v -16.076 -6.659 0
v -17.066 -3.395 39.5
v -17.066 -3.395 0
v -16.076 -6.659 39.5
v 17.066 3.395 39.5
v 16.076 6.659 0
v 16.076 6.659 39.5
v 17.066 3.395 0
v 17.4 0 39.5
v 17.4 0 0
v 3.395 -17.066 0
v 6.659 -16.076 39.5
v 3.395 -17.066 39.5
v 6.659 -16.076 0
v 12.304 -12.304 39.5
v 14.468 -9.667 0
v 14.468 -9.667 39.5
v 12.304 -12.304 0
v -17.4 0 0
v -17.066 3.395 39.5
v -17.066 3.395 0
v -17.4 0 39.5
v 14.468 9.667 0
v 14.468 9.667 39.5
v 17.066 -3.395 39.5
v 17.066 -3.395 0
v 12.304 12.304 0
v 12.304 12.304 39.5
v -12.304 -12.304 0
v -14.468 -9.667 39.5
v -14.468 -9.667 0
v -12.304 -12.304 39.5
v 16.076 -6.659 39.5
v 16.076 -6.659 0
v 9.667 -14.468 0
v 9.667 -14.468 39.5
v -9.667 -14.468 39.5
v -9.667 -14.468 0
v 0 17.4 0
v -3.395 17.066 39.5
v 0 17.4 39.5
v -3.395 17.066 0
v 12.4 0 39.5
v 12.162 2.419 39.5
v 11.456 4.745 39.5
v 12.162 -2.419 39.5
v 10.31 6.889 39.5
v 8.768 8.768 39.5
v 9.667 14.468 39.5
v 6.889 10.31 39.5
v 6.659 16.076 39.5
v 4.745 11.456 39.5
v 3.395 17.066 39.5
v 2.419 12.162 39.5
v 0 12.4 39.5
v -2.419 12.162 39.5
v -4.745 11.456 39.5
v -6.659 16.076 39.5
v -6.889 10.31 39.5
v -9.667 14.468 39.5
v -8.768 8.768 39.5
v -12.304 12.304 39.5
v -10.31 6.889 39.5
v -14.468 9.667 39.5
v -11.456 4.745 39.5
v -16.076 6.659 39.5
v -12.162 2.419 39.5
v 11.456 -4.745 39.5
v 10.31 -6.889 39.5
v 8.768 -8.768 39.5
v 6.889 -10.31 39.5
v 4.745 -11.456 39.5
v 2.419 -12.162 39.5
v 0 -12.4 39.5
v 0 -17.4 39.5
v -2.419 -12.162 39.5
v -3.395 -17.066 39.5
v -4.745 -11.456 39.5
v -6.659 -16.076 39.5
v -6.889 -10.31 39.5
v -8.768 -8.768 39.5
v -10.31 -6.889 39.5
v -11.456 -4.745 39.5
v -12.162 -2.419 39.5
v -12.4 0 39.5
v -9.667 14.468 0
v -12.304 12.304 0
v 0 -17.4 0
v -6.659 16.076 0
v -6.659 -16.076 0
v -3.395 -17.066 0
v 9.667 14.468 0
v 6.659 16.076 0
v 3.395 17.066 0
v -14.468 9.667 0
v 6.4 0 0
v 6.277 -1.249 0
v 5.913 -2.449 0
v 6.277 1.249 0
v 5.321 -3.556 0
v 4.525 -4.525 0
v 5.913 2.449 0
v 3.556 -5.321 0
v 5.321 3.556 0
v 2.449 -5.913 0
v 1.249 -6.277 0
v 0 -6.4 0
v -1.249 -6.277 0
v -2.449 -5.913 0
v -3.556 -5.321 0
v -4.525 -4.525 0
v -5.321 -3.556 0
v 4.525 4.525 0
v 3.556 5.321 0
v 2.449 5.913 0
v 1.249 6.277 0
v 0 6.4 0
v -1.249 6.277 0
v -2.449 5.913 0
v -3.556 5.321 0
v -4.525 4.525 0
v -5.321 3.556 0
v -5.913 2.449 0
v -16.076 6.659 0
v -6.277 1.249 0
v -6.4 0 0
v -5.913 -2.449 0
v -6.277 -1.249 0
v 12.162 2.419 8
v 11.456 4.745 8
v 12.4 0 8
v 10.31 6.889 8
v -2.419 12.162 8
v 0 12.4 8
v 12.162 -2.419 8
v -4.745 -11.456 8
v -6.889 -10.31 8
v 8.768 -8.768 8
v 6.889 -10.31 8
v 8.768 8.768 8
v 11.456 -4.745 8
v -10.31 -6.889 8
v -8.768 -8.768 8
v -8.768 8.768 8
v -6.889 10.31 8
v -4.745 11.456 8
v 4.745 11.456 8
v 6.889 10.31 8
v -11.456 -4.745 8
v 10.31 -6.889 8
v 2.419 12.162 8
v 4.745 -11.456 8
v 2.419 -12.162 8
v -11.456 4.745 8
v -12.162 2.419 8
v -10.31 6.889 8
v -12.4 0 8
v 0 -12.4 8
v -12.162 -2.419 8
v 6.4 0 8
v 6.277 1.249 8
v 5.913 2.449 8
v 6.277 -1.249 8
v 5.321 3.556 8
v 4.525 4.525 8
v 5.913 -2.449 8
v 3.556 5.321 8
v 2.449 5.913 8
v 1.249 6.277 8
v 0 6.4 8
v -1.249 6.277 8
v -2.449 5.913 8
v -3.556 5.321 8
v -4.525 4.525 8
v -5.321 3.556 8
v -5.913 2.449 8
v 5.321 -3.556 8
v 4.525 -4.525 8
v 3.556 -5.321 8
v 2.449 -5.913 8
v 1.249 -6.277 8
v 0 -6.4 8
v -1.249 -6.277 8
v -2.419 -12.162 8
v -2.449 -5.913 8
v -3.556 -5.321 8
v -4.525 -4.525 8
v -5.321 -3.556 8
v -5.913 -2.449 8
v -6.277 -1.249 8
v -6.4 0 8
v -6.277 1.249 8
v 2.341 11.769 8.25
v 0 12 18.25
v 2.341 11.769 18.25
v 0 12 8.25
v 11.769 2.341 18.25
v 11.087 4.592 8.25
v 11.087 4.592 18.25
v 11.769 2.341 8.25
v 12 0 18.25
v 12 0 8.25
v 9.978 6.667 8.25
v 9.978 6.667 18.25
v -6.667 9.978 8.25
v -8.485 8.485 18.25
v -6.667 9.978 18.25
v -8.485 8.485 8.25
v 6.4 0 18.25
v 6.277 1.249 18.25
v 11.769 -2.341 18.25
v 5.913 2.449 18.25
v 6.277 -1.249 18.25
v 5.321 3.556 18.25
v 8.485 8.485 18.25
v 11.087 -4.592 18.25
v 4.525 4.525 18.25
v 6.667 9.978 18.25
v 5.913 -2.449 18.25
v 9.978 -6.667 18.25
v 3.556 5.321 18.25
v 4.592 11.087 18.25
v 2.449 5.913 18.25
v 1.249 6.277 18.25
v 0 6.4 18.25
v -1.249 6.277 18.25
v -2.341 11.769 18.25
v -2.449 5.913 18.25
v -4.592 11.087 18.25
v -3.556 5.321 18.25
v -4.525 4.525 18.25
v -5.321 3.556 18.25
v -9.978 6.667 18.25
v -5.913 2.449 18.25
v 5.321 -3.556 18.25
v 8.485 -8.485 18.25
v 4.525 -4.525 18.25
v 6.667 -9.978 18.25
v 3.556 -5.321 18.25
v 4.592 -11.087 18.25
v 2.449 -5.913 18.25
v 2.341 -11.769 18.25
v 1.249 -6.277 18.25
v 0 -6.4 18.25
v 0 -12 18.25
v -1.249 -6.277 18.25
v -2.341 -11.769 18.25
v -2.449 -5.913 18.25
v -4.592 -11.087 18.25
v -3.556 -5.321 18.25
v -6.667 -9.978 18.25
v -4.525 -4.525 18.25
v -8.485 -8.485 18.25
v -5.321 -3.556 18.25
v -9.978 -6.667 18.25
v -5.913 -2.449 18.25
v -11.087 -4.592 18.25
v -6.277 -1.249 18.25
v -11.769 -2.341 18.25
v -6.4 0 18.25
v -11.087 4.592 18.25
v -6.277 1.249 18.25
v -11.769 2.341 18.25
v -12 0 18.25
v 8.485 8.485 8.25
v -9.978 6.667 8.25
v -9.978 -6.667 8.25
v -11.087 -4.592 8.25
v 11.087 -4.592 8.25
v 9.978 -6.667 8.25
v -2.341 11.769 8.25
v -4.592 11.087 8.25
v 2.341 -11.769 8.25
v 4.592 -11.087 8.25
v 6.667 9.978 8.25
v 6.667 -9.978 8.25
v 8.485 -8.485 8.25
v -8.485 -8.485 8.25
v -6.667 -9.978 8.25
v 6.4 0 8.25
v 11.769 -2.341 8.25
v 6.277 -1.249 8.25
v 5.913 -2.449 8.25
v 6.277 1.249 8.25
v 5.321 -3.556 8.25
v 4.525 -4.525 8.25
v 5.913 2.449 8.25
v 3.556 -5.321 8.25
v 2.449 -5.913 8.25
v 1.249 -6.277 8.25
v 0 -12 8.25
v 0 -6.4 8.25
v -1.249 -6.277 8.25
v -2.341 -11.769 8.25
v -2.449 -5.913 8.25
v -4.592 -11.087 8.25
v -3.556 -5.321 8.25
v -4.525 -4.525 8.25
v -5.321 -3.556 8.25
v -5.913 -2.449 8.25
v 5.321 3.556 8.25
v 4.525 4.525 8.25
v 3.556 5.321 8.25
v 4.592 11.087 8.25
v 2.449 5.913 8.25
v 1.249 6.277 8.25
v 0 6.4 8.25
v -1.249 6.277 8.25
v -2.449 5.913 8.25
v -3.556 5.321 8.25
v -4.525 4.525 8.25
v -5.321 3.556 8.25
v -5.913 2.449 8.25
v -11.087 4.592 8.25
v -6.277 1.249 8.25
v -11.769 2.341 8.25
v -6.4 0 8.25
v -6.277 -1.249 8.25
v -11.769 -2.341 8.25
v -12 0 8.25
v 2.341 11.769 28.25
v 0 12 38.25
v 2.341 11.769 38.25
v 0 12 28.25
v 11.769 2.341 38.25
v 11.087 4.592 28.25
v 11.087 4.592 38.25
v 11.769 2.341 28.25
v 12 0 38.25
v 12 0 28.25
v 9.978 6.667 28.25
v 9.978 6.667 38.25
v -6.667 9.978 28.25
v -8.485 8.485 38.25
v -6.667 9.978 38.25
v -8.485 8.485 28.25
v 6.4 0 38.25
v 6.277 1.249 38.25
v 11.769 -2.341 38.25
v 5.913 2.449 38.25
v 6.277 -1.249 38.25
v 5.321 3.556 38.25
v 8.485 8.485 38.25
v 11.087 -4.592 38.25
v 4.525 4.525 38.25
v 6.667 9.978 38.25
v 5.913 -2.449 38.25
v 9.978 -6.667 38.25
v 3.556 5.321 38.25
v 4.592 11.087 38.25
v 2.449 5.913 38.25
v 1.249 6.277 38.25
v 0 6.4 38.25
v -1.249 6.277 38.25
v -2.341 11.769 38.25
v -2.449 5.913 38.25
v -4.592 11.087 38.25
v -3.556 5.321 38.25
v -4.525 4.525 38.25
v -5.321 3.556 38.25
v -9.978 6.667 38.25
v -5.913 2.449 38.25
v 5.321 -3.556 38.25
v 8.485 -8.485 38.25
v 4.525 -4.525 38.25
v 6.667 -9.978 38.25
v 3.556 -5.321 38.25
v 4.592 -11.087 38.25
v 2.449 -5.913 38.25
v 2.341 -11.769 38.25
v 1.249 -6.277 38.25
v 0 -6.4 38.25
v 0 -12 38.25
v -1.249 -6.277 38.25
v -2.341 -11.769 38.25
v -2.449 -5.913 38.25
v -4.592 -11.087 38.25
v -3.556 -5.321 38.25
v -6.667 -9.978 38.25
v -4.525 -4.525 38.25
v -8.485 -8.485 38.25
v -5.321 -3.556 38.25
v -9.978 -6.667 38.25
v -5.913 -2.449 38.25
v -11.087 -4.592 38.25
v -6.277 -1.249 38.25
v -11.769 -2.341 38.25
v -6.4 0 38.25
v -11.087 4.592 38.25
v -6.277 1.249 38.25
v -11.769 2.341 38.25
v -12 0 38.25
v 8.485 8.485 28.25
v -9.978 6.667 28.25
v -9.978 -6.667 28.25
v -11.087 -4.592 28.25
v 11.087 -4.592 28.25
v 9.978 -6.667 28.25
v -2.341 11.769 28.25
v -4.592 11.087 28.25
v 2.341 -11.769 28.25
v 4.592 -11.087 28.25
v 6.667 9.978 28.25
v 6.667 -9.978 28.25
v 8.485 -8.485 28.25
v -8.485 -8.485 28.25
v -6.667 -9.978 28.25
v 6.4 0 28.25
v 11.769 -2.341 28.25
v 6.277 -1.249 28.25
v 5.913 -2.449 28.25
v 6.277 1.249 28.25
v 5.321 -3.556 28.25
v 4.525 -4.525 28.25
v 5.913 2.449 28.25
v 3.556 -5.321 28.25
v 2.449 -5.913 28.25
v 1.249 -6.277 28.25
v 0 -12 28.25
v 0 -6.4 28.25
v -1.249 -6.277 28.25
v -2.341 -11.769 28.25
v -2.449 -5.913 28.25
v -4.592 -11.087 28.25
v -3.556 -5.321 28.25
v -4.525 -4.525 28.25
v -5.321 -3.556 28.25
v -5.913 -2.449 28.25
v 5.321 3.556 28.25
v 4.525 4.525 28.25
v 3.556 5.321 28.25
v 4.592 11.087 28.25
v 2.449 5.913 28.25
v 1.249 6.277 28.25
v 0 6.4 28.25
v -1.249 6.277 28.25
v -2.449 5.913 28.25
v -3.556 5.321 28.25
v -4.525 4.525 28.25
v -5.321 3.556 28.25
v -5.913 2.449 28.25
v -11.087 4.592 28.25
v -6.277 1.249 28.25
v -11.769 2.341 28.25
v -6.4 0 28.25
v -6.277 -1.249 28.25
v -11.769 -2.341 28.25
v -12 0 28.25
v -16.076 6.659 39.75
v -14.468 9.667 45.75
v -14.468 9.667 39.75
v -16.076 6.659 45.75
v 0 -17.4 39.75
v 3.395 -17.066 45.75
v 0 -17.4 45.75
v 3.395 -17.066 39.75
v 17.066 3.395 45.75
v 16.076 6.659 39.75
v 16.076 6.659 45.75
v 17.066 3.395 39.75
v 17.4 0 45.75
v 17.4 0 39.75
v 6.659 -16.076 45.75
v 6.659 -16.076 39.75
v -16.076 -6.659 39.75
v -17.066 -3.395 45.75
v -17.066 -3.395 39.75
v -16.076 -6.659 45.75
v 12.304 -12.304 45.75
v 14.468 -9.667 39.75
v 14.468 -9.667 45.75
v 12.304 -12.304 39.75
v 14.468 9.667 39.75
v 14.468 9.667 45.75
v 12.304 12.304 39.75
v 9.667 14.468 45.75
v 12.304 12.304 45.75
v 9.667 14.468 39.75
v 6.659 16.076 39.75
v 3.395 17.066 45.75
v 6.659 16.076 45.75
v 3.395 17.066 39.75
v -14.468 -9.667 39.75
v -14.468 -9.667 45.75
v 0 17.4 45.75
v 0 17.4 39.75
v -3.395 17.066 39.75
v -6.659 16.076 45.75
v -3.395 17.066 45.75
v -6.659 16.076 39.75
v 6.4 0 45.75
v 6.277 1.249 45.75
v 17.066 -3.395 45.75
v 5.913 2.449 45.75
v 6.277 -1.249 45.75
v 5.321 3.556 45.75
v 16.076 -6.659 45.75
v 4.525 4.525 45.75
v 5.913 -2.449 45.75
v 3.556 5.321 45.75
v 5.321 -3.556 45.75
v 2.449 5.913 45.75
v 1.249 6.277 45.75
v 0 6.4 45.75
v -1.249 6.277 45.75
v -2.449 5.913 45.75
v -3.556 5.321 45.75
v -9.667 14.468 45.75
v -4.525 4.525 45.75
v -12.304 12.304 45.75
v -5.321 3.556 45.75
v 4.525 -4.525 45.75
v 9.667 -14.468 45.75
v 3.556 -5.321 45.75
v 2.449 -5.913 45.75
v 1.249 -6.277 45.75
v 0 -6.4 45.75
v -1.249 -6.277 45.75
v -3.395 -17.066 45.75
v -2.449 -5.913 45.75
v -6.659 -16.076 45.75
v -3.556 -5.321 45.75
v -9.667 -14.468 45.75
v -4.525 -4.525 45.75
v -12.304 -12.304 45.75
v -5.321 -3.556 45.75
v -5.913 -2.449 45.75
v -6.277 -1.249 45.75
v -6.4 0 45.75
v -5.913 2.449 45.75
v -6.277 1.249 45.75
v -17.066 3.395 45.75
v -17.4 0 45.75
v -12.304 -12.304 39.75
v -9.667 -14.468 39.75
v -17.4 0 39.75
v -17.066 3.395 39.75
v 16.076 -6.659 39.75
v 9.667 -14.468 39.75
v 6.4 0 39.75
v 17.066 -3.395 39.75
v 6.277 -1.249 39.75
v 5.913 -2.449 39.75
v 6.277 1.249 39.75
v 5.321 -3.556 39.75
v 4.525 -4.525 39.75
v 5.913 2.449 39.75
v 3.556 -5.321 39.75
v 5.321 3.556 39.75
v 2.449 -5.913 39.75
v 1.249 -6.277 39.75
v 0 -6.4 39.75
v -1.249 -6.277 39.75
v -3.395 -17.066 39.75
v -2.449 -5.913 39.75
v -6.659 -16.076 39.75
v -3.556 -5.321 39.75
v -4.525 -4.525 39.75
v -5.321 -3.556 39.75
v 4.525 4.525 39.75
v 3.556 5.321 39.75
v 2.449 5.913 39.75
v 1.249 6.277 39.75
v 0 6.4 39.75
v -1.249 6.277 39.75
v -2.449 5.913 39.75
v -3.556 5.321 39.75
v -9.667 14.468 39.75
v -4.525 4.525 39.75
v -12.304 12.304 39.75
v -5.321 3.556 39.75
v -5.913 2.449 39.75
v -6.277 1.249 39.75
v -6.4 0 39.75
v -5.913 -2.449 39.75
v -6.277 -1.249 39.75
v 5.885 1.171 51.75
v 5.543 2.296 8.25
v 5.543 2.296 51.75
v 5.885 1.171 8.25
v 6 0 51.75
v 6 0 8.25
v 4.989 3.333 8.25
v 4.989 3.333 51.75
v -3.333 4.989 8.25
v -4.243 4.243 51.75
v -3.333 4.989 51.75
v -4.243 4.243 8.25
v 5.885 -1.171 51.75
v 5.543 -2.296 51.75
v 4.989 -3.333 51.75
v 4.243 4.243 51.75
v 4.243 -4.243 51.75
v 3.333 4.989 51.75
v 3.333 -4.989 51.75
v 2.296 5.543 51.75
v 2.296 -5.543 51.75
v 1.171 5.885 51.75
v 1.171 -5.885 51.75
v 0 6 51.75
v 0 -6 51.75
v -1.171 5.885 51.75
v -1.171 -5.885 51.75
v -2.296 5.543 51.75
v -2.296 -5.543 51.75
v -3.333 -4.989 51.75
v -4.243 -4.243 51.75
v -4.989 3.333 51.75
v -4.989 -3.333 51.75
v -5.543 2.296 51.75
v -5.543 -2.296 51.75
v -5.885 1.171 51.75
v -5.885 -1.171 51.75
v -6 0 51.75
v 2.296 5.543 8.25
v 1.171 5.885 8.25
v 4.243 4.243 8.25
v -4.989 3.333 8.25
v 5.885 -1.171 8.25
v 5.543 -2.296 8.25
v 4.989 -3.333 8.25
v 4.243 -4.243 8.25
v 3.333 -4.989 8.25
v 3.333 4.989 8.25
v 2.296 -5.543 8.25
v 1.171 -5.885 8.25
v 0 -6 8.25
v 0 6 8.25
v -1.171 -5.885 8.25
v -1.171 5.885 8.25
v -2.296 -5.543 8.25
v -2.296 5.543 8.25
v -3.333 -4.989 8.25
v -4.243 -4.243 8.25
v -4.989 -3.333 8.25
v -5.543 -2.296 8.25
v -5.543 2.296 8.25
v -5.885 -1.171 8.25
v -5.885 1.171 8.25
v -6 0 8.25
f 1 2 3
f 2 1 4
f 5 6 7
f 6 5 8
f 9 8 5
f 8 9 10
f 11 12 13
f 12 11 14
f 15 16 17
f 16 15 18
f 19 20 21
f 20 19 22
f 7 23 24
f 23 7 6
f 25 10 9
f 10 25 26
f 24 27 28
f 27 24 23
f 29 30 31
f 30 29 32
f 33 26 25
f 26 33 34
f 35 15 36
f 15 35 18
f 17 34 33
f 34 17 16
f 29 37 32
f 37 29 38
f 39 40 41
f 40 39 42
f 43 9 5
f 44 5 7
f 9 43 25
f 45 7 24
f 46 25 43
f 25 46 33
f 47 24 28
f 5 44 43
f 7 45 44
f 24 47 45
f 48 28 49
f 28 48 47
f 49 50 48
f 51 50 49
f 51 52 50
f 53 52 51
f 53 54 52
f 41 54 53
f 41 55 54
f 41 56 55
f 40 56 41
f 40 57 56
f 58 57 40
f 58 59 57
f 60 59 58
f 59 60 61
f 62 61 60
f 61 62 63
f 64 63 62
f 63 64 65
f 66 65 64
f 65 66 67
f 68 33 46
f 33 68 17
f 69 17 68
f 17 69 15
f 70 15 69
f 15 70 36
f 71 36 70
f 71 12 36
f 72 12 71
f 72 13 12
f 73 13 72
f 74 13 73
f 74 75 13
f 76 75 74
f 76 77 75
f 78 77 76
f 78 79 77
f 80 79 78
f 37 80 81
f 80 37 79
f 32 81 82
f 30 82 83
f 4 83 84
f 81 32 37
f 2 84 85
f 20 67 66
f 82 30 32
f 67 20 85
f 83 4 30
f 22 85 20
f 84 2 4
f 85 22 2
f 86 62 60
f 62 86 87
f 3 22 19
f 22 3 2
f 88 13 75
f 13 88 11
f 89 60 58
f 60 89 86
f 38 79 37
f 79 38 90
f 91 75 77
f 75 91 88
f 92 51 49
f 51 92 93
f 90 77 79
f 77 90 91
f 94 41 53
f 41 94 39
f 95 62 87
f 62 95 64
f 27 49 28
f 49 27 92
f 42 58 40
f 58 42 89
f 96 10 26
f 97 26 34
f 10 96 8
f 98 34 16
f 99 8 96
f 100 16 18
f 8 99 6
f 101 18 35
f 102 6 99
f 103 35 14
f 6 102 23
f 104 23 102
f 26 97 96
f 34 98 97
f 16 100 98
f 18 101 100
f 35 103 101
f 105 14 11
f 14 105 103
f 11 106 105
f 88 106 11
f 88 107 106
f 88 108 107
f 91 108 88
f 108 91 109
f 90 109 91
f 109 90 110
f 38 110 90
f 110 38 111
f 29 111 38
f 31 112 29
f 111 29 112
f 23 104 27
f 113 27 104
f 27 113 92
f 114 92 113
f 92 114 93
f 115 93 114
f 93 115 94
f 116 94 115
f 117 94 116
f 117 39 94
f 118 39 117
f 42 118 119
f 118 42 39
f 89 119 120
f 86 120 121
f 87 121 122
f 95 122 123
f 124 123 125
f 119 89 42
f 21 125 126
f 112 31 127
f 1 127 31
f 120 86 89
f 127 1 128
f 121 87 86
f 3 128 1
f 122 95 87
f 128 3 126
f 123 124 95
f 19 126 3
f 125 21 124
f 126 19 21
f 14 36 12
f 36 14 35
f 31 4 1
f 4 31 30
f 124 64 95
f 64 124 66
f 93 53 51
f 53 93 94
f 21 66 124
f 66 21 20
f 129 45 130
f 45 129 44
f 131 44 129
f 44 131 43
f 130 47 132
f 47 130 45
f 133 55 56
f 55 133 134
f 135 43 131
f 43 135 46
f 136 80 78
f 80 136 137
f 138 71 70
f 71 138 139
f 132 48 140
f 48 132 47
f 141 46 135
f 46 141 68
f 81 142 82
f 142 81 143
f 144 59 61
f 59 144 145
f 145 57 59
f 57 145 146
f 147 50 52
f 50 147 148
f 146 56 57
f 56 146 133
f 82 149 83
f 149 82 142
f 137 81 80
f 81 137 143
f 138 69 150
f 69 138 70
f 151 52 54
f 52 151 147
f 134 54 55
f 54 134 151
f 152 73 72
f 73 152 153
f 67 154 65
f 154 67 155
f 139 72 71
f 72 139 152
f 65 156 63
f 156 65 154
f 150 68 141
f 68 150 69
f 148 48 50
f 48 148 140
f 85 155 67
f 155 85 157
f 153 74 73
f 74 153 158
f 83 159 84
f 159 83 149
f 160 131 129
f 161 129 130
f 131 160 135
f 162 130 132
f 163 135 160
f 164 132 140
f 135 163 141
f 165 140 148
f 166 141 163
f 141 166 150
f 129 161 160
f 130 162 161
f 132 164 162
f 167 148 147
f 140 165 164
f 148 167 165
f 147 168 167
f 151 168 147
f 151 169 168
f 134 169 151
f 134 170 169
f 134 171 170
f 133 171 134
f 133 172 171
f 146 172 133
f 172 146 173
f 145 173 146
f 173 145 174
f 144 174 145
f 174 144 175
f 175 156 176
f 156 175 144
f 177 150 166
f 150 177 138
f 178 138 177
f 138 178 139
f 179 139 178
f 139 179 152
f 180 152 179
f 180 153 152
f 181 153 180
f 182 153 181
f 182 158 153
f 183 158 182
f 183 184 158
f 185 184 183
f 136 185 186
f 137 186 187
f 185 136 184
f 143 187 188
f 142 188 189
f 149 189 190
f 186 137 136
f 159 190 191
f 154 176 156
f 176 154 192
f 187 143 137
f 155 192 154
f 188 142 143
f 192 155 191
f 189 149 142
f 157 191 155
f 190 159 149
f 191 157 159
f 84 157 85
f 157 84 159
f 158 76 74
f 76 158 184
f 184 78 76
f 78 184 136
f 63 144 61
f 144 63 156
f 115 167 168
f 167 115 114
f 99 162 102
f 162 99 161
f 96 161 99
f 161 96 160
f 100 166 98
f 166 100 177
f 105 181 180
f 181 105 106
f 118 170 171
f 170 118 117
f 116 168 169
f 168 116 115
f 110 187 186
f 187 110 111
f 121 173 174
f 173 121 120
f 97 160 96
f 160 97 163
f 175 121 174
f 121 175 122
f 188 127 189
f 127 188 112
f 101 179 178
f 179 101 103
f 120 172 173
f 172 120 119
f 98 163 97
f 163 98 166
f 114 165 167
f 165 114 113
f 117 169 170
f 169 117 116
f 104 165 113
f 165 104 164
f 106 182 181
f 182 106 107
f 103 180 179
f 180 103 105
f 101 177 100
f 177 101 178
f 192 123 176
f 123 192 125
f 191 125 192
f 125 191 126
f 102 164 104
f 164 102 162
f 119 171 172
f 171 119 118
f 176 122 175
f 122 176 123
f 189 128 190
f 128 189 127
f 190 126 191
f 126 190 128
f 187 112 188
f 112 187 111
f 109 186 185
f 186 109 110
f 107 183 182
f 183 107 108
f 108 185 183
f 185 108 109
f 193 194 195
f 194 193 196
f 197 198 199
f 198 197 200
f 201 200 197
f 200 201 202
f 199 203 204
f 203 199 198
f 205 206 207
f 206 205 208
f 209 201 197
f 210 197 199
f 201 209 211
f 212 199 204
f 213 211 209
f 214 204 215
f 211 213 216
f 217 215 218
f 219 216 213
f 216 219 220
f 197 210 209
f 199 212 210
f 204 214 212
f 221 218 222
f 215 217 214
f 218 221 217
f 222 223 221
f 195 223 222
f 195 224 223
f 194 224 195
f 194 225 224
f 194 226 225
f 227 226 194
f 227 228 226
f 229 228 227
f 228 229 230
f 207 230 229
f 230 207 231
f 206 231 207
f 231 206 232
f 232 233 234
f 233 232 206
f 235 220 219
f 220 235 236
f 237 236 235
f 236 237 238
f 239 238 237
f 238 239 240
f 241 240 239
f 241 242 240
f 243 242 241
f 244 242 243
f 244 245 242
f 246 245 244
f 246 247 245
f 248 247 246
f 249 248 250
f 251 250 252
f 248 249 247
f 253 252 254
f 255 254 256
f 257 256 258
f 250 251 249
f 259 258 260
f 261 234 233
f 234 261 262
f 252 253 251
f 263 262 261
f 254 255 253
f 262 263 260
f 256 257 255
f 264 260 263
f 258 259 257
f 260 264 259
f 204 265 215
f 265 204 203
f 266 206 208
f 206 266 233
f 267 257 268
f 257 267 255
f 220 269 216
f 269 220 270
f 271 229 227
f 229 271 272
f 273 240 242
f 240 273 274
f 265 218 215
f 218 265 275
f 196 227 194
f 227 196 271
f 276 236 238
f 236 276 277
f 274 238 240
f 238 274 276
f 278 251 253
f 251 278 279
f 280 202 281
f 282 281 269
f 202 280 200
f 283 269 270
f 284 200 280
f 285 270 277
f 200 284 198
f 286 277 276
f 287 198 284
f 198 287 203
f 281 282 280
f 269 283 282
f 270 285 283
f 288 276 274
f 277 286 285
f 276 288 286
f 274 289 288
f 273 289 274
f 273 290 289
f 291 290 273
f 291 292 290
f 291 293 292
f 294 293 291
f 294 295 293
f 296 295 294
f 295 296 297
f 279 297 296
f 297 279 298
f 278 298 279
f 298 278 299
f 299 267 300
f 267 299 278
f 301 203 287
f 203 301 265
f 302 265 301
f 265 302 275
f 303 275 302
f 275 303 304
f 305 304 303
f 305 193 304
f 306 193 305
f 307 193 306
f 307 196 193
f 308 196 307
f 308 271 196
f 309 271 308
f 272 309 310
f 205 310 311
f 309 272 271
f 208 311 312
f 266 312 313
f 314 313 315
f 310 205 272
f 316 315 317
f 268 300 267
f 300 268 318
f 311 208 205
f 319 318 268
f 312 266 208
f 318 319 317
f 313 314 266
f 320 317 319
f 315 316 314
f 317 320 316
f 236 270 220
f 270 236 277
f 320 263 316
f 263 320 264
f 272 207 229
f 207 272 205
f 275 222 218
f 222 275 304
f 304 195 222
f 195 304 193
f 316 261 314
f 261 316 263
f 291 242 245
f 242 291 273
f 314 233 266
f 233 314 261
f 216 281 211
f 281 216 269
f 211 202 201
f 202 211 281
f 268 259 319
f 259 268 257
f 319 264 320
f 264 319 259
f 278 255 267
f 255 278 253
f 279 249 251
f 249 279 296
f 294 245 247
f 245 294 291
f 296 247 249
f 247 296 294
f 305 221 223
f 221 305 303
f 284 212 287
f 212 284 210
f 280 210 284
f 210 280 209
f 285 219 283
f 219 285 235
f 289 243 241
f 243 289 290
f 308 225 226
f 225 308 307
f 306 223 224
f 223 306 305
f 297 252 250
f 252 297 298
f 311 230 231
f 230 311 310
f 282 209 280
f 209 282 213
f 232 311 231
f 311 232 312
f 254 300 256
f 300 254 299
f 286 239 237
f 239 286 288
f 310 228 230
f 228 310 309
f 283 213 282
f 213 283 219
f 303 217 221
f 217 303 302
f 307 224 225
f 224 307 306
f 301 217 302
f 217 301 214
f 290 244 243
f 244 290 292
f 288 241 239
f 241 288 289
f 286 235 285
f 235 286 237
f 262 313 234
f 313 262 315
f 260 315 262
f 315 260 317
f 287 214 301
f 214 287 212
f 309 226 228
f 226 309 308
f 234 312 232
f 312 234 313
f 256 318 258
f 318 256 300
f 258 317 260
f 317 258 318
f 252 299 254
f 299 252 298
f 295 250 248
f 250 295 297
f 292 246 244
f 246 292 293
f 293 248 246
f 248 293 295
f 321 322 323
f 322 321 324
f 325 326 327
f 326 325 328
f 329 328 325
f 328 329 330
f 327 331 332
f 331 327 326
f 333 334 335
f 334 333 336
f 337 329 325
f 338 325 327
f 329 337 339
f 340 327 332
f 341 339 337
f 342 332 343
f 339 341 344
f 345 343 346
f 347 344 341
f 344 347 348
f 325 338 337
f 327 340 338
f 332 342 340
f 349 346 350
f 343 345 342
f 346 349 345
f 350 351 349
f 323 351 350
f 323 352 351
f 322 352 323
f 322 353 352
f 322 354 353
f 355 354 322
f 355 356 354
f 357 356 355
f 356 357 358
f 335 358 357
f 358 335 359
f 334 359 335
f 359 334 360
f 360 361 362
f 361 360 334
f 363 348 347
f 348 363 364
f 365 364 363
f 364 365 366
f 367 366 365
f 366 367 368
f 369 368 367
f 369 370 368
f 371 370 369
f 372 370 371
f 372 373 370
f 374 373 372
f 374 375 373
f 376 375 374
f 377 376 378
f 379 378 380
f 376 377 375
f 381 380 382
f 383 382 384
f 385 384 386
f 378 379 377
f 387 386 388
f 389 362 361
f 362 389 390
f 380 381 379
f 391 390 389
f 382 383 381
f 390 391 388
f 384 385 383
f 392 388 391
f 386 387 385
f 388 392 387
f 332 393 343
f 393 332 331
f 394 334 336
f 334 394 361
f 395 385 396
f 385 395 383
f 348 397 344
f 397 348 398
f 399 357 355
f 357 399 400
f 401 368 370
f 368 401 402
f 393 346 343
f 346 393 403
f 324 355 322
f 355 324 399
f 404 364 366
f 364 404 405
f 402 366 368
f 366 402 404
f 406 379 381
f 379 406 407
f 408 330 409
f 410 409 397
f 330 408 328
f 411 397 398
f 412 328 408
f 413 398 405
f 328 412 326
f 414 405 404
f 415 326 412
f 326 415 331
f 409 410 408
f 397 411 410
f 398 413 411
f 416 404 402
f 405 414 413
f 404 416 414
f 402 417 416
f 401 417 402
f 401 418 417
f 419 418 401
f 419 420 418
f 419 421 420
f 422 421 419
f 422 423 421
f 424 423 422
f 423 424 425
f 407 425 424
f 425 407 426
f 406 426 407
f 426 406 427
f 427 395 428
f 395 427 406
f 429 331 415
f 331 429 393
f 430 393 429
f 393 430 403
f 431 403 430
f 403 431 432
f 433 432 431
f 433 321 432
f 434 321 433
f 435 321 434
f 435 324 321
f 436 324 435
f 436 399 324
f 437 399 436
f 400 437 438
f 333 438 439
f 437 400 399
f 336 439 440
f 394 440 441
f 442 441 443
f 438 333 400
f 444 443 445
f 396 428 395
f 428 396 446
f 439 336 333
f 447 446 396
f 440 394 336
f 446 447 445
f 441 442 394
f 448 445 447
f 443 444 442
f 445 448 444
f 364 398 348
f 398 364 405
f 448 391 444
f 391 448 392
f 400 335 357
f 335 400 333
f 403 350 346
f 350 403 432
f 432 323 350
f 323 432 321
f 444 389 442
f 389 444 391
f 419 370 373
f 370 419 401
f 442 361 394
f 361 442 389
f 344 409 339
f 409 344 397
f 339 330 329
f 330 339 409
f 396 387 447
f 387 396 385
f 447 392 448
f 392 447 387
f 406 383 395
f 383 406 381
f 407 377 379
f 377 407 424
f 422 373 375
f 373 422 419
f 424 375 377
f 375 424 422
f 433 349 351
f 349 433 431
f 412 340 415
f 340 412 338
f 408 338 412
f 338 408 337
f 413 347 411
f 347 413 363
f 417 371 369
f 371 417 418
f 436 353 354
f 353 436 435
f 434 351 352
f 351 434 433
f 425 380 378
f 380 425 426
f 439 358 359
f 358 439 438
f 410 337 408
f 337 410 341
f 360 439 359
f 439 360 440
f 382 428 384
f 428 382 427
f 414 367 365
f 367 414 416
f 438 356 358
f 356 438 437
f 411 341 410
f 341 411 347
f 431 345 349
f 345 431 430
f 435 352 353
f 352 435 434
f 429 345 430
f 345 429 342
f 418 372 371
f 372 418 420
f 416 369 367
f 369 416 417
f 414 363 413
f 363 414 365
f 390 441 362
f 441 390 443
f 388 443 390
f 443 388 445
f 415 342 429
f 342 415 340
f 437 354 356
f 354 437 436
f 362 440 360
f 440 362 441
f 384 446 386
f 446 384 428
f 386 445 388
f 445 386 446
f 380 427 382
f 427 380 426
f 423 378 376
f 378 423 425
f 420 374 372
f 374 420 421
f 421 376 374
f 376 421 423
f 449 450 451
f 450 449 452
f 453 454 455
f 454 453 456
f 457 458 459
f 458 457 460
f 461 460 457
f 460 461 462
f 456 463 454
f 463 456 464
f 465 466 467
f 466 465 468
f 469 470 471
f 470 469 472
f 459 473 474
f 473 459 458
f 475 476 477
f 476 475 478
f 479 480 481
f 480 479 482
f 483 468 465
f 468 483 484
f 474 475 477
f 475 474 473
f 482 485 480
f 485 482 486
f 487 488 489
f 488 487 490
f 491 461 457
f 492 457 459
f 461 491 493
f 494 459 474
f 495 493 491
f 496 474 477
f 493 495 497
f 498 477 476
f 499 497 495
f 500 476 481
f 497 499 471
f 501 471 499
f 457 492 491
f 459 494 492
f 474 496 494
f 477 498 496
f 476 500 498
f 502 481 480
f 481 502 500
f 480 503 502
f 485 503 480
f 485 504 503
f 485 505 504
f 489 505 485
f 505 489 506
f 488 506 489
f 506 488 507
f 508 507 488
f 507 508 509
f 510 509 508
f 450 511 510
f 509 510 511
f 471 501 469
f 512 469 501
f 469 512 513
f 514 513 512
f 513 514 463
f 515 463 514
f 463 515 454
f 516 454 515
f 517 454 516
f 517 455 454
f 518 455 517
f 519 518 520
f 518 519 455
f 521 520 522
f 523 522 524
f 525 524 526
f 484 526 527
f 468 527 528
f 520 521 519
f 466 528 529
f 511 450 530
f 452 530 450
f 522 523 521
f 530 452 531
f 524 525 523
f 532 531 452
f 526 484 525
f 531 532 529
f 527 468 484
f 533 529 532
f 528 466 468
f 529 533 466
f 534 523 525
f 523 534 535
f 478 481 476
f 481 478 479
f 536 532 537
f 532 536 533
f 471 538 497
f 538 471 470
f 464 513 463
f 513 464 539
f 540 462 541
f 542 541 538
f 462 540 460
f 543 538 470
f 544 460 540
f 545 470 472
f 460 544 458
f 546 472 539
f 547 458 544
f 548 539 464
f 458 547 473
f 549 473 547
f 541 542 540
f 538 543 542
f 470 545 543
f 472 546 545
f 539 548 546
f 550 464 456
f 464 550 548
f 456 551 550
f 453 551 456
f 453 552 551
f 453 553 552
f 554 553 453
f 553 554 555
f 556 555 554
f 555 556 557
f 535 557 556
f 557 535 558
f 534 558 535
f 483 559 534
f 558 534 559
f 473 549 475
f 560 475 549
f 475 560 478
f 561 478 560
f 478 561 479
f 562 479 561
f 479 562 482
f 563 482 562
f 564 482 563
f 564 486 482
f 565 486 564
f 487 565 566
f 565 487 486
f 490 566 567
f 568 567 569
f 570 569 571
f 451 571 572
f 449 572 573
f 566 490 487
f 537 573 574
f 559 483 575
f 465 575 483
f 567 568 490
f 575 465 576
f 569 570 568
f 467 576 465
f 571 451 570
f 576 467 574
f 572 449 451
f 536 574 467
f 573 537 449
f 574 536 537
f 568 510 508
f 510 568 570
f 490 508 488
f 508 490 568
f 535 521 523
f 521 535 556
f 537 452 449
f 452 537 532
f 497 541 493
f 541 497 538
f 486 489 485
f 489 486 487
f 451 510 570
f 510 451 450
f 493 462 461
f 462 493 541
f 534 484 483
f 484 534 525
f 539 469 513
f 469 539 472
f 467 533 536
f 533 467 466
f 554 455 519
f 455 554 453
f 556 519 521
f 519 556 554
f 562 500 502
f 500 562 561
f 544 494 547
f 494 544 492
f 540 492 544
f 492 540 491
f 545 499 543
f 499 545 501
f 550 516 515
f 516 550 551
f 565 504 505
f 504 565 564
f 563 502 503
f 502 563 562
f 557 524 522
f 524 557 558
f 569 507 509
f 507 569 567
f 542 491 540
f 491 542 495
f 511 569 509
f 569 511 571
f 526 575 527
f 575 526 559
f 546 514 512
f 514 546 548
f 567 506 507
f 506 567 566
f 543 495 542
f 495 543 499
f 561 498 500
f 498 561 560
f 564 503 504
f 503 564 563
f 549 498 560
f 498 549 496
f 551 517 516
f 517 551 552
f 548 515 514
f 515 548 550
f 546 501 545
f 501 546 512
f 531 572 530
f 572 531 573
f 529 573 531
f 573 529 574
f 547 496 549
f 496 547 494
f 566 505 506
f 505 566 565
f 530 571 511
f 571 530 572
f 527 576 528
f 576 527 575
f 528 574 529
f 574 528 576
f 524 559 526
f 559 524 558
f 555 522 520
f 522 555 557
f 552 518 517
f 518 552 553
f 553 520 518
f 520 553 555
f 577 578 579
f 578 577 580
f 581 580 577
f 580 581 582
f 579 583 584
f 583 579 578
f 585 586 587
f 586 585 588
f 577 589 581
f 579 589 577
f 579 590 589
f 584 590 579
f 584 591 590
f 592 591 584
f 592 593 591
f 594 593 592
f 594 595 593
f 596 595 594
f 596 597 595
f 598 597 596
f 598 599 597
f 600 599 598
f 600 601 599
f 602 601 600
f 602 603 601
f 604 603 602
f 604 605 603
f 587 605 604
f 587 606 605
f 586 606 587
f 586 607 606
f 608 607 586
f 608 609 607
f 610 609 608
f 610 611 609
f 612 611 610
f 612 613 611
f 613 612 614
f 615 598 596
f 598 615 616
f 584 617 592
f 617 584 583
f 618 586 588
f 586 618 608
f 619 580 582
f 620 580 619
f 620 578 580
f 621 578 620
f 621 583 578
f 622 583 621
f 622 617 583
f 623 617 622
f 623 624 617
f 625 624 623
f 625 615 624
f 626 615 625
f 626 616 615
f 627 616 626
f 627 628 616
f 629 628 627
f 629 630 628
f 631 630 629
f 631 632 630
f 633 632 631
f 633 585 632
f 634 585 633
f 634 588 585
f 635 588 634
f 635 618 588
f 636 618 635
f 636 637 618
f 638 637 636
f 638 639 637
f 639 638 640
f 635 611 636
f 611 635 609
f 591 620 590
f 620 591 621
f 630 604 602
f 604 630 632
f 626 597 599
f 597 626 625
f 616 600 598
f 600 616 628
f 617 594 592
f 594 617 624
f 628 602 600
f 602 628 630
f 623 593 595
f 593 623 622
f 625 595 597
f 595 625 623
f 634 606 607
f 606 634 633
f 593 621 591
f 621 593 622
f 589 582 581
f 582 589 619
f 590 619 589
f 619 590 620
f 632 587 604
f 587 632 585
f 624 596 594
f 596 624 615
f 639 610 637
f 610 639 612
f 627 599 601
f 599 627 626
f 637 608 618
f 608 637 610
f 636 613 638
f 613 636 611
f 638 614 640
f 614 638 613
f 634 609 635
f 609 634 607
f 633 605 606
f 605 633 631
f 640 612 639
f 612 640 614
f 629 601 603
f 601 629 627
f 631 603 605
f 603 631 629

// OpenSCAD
$fn = 32;

// ------------------------------------------------------------------------
// Shaft station: cup d34.8 x 39.5 mm, shaft d12
// Every part is its own module, assembly() places every instance.
// ------------------------------------------------------------------------

// --- part 1 ---
module housing_cup() {
  difference() {
    cylinder(h = 39.5, d = 34.8);
    translate([0, 0, 8]) cylinder(h = 32.5, d = 24.8);
    translate([0, 0, -1]) cylinder(h = 10, d = 12.8);
  }
}

// --- part 2 ---
module bearing_lower() {
  difference() {
      translate([0, 0, 0]) cylinder(h = 10, d = 24);
      translate([0, 0, -1]) cylinder(h = 12, d = 12.8);
    }
}

// --- part 3 ---
module bearing_upper() {
  difference() {
      translate([0, 0, 0]) cylinder(h = 10, d = 24);
      translate([0, 0, -1]) cylinder(h = 12, d = 12.8);
    }
}

// --- part 4 ---
module station_shaft() {
  translate([0, 0, -21.75]) cylinder(h = 43.5, d = 12);
}

// --- part 5 ---
module station_cover() {
  difference() {
    cylinder(h = 6, d = 34.8);
    translate([0, 0, -1]) cylinder(h = 8, d = 12.8);
  }
}

// --- assembly ---
module assembly() {
  color([0.80, 0.24, 0.20]) translate([0, 0, 0]) rotate([0, 0, 0]) housing_cup();
  color([0.20, 0.45, 0.75]) translate([0, 0, 8.25]) rotate([0, 0, 0]) bearing_lower();
  color([0.25, 0.62, 0.32]) translate([0, 0, 28.25]) rotate([0, 0, 0]) bearing_upper();
  color([0.92, 0.70, 0.18]) translate([0, 0, 30]) rotate([0, 0, 0]) station_shaft();
  color([0.58, 0.35, 0.70]) translate([0, 0, 39.75]) rotate([0, 0, 0]) station_cover();
}

assembly();
